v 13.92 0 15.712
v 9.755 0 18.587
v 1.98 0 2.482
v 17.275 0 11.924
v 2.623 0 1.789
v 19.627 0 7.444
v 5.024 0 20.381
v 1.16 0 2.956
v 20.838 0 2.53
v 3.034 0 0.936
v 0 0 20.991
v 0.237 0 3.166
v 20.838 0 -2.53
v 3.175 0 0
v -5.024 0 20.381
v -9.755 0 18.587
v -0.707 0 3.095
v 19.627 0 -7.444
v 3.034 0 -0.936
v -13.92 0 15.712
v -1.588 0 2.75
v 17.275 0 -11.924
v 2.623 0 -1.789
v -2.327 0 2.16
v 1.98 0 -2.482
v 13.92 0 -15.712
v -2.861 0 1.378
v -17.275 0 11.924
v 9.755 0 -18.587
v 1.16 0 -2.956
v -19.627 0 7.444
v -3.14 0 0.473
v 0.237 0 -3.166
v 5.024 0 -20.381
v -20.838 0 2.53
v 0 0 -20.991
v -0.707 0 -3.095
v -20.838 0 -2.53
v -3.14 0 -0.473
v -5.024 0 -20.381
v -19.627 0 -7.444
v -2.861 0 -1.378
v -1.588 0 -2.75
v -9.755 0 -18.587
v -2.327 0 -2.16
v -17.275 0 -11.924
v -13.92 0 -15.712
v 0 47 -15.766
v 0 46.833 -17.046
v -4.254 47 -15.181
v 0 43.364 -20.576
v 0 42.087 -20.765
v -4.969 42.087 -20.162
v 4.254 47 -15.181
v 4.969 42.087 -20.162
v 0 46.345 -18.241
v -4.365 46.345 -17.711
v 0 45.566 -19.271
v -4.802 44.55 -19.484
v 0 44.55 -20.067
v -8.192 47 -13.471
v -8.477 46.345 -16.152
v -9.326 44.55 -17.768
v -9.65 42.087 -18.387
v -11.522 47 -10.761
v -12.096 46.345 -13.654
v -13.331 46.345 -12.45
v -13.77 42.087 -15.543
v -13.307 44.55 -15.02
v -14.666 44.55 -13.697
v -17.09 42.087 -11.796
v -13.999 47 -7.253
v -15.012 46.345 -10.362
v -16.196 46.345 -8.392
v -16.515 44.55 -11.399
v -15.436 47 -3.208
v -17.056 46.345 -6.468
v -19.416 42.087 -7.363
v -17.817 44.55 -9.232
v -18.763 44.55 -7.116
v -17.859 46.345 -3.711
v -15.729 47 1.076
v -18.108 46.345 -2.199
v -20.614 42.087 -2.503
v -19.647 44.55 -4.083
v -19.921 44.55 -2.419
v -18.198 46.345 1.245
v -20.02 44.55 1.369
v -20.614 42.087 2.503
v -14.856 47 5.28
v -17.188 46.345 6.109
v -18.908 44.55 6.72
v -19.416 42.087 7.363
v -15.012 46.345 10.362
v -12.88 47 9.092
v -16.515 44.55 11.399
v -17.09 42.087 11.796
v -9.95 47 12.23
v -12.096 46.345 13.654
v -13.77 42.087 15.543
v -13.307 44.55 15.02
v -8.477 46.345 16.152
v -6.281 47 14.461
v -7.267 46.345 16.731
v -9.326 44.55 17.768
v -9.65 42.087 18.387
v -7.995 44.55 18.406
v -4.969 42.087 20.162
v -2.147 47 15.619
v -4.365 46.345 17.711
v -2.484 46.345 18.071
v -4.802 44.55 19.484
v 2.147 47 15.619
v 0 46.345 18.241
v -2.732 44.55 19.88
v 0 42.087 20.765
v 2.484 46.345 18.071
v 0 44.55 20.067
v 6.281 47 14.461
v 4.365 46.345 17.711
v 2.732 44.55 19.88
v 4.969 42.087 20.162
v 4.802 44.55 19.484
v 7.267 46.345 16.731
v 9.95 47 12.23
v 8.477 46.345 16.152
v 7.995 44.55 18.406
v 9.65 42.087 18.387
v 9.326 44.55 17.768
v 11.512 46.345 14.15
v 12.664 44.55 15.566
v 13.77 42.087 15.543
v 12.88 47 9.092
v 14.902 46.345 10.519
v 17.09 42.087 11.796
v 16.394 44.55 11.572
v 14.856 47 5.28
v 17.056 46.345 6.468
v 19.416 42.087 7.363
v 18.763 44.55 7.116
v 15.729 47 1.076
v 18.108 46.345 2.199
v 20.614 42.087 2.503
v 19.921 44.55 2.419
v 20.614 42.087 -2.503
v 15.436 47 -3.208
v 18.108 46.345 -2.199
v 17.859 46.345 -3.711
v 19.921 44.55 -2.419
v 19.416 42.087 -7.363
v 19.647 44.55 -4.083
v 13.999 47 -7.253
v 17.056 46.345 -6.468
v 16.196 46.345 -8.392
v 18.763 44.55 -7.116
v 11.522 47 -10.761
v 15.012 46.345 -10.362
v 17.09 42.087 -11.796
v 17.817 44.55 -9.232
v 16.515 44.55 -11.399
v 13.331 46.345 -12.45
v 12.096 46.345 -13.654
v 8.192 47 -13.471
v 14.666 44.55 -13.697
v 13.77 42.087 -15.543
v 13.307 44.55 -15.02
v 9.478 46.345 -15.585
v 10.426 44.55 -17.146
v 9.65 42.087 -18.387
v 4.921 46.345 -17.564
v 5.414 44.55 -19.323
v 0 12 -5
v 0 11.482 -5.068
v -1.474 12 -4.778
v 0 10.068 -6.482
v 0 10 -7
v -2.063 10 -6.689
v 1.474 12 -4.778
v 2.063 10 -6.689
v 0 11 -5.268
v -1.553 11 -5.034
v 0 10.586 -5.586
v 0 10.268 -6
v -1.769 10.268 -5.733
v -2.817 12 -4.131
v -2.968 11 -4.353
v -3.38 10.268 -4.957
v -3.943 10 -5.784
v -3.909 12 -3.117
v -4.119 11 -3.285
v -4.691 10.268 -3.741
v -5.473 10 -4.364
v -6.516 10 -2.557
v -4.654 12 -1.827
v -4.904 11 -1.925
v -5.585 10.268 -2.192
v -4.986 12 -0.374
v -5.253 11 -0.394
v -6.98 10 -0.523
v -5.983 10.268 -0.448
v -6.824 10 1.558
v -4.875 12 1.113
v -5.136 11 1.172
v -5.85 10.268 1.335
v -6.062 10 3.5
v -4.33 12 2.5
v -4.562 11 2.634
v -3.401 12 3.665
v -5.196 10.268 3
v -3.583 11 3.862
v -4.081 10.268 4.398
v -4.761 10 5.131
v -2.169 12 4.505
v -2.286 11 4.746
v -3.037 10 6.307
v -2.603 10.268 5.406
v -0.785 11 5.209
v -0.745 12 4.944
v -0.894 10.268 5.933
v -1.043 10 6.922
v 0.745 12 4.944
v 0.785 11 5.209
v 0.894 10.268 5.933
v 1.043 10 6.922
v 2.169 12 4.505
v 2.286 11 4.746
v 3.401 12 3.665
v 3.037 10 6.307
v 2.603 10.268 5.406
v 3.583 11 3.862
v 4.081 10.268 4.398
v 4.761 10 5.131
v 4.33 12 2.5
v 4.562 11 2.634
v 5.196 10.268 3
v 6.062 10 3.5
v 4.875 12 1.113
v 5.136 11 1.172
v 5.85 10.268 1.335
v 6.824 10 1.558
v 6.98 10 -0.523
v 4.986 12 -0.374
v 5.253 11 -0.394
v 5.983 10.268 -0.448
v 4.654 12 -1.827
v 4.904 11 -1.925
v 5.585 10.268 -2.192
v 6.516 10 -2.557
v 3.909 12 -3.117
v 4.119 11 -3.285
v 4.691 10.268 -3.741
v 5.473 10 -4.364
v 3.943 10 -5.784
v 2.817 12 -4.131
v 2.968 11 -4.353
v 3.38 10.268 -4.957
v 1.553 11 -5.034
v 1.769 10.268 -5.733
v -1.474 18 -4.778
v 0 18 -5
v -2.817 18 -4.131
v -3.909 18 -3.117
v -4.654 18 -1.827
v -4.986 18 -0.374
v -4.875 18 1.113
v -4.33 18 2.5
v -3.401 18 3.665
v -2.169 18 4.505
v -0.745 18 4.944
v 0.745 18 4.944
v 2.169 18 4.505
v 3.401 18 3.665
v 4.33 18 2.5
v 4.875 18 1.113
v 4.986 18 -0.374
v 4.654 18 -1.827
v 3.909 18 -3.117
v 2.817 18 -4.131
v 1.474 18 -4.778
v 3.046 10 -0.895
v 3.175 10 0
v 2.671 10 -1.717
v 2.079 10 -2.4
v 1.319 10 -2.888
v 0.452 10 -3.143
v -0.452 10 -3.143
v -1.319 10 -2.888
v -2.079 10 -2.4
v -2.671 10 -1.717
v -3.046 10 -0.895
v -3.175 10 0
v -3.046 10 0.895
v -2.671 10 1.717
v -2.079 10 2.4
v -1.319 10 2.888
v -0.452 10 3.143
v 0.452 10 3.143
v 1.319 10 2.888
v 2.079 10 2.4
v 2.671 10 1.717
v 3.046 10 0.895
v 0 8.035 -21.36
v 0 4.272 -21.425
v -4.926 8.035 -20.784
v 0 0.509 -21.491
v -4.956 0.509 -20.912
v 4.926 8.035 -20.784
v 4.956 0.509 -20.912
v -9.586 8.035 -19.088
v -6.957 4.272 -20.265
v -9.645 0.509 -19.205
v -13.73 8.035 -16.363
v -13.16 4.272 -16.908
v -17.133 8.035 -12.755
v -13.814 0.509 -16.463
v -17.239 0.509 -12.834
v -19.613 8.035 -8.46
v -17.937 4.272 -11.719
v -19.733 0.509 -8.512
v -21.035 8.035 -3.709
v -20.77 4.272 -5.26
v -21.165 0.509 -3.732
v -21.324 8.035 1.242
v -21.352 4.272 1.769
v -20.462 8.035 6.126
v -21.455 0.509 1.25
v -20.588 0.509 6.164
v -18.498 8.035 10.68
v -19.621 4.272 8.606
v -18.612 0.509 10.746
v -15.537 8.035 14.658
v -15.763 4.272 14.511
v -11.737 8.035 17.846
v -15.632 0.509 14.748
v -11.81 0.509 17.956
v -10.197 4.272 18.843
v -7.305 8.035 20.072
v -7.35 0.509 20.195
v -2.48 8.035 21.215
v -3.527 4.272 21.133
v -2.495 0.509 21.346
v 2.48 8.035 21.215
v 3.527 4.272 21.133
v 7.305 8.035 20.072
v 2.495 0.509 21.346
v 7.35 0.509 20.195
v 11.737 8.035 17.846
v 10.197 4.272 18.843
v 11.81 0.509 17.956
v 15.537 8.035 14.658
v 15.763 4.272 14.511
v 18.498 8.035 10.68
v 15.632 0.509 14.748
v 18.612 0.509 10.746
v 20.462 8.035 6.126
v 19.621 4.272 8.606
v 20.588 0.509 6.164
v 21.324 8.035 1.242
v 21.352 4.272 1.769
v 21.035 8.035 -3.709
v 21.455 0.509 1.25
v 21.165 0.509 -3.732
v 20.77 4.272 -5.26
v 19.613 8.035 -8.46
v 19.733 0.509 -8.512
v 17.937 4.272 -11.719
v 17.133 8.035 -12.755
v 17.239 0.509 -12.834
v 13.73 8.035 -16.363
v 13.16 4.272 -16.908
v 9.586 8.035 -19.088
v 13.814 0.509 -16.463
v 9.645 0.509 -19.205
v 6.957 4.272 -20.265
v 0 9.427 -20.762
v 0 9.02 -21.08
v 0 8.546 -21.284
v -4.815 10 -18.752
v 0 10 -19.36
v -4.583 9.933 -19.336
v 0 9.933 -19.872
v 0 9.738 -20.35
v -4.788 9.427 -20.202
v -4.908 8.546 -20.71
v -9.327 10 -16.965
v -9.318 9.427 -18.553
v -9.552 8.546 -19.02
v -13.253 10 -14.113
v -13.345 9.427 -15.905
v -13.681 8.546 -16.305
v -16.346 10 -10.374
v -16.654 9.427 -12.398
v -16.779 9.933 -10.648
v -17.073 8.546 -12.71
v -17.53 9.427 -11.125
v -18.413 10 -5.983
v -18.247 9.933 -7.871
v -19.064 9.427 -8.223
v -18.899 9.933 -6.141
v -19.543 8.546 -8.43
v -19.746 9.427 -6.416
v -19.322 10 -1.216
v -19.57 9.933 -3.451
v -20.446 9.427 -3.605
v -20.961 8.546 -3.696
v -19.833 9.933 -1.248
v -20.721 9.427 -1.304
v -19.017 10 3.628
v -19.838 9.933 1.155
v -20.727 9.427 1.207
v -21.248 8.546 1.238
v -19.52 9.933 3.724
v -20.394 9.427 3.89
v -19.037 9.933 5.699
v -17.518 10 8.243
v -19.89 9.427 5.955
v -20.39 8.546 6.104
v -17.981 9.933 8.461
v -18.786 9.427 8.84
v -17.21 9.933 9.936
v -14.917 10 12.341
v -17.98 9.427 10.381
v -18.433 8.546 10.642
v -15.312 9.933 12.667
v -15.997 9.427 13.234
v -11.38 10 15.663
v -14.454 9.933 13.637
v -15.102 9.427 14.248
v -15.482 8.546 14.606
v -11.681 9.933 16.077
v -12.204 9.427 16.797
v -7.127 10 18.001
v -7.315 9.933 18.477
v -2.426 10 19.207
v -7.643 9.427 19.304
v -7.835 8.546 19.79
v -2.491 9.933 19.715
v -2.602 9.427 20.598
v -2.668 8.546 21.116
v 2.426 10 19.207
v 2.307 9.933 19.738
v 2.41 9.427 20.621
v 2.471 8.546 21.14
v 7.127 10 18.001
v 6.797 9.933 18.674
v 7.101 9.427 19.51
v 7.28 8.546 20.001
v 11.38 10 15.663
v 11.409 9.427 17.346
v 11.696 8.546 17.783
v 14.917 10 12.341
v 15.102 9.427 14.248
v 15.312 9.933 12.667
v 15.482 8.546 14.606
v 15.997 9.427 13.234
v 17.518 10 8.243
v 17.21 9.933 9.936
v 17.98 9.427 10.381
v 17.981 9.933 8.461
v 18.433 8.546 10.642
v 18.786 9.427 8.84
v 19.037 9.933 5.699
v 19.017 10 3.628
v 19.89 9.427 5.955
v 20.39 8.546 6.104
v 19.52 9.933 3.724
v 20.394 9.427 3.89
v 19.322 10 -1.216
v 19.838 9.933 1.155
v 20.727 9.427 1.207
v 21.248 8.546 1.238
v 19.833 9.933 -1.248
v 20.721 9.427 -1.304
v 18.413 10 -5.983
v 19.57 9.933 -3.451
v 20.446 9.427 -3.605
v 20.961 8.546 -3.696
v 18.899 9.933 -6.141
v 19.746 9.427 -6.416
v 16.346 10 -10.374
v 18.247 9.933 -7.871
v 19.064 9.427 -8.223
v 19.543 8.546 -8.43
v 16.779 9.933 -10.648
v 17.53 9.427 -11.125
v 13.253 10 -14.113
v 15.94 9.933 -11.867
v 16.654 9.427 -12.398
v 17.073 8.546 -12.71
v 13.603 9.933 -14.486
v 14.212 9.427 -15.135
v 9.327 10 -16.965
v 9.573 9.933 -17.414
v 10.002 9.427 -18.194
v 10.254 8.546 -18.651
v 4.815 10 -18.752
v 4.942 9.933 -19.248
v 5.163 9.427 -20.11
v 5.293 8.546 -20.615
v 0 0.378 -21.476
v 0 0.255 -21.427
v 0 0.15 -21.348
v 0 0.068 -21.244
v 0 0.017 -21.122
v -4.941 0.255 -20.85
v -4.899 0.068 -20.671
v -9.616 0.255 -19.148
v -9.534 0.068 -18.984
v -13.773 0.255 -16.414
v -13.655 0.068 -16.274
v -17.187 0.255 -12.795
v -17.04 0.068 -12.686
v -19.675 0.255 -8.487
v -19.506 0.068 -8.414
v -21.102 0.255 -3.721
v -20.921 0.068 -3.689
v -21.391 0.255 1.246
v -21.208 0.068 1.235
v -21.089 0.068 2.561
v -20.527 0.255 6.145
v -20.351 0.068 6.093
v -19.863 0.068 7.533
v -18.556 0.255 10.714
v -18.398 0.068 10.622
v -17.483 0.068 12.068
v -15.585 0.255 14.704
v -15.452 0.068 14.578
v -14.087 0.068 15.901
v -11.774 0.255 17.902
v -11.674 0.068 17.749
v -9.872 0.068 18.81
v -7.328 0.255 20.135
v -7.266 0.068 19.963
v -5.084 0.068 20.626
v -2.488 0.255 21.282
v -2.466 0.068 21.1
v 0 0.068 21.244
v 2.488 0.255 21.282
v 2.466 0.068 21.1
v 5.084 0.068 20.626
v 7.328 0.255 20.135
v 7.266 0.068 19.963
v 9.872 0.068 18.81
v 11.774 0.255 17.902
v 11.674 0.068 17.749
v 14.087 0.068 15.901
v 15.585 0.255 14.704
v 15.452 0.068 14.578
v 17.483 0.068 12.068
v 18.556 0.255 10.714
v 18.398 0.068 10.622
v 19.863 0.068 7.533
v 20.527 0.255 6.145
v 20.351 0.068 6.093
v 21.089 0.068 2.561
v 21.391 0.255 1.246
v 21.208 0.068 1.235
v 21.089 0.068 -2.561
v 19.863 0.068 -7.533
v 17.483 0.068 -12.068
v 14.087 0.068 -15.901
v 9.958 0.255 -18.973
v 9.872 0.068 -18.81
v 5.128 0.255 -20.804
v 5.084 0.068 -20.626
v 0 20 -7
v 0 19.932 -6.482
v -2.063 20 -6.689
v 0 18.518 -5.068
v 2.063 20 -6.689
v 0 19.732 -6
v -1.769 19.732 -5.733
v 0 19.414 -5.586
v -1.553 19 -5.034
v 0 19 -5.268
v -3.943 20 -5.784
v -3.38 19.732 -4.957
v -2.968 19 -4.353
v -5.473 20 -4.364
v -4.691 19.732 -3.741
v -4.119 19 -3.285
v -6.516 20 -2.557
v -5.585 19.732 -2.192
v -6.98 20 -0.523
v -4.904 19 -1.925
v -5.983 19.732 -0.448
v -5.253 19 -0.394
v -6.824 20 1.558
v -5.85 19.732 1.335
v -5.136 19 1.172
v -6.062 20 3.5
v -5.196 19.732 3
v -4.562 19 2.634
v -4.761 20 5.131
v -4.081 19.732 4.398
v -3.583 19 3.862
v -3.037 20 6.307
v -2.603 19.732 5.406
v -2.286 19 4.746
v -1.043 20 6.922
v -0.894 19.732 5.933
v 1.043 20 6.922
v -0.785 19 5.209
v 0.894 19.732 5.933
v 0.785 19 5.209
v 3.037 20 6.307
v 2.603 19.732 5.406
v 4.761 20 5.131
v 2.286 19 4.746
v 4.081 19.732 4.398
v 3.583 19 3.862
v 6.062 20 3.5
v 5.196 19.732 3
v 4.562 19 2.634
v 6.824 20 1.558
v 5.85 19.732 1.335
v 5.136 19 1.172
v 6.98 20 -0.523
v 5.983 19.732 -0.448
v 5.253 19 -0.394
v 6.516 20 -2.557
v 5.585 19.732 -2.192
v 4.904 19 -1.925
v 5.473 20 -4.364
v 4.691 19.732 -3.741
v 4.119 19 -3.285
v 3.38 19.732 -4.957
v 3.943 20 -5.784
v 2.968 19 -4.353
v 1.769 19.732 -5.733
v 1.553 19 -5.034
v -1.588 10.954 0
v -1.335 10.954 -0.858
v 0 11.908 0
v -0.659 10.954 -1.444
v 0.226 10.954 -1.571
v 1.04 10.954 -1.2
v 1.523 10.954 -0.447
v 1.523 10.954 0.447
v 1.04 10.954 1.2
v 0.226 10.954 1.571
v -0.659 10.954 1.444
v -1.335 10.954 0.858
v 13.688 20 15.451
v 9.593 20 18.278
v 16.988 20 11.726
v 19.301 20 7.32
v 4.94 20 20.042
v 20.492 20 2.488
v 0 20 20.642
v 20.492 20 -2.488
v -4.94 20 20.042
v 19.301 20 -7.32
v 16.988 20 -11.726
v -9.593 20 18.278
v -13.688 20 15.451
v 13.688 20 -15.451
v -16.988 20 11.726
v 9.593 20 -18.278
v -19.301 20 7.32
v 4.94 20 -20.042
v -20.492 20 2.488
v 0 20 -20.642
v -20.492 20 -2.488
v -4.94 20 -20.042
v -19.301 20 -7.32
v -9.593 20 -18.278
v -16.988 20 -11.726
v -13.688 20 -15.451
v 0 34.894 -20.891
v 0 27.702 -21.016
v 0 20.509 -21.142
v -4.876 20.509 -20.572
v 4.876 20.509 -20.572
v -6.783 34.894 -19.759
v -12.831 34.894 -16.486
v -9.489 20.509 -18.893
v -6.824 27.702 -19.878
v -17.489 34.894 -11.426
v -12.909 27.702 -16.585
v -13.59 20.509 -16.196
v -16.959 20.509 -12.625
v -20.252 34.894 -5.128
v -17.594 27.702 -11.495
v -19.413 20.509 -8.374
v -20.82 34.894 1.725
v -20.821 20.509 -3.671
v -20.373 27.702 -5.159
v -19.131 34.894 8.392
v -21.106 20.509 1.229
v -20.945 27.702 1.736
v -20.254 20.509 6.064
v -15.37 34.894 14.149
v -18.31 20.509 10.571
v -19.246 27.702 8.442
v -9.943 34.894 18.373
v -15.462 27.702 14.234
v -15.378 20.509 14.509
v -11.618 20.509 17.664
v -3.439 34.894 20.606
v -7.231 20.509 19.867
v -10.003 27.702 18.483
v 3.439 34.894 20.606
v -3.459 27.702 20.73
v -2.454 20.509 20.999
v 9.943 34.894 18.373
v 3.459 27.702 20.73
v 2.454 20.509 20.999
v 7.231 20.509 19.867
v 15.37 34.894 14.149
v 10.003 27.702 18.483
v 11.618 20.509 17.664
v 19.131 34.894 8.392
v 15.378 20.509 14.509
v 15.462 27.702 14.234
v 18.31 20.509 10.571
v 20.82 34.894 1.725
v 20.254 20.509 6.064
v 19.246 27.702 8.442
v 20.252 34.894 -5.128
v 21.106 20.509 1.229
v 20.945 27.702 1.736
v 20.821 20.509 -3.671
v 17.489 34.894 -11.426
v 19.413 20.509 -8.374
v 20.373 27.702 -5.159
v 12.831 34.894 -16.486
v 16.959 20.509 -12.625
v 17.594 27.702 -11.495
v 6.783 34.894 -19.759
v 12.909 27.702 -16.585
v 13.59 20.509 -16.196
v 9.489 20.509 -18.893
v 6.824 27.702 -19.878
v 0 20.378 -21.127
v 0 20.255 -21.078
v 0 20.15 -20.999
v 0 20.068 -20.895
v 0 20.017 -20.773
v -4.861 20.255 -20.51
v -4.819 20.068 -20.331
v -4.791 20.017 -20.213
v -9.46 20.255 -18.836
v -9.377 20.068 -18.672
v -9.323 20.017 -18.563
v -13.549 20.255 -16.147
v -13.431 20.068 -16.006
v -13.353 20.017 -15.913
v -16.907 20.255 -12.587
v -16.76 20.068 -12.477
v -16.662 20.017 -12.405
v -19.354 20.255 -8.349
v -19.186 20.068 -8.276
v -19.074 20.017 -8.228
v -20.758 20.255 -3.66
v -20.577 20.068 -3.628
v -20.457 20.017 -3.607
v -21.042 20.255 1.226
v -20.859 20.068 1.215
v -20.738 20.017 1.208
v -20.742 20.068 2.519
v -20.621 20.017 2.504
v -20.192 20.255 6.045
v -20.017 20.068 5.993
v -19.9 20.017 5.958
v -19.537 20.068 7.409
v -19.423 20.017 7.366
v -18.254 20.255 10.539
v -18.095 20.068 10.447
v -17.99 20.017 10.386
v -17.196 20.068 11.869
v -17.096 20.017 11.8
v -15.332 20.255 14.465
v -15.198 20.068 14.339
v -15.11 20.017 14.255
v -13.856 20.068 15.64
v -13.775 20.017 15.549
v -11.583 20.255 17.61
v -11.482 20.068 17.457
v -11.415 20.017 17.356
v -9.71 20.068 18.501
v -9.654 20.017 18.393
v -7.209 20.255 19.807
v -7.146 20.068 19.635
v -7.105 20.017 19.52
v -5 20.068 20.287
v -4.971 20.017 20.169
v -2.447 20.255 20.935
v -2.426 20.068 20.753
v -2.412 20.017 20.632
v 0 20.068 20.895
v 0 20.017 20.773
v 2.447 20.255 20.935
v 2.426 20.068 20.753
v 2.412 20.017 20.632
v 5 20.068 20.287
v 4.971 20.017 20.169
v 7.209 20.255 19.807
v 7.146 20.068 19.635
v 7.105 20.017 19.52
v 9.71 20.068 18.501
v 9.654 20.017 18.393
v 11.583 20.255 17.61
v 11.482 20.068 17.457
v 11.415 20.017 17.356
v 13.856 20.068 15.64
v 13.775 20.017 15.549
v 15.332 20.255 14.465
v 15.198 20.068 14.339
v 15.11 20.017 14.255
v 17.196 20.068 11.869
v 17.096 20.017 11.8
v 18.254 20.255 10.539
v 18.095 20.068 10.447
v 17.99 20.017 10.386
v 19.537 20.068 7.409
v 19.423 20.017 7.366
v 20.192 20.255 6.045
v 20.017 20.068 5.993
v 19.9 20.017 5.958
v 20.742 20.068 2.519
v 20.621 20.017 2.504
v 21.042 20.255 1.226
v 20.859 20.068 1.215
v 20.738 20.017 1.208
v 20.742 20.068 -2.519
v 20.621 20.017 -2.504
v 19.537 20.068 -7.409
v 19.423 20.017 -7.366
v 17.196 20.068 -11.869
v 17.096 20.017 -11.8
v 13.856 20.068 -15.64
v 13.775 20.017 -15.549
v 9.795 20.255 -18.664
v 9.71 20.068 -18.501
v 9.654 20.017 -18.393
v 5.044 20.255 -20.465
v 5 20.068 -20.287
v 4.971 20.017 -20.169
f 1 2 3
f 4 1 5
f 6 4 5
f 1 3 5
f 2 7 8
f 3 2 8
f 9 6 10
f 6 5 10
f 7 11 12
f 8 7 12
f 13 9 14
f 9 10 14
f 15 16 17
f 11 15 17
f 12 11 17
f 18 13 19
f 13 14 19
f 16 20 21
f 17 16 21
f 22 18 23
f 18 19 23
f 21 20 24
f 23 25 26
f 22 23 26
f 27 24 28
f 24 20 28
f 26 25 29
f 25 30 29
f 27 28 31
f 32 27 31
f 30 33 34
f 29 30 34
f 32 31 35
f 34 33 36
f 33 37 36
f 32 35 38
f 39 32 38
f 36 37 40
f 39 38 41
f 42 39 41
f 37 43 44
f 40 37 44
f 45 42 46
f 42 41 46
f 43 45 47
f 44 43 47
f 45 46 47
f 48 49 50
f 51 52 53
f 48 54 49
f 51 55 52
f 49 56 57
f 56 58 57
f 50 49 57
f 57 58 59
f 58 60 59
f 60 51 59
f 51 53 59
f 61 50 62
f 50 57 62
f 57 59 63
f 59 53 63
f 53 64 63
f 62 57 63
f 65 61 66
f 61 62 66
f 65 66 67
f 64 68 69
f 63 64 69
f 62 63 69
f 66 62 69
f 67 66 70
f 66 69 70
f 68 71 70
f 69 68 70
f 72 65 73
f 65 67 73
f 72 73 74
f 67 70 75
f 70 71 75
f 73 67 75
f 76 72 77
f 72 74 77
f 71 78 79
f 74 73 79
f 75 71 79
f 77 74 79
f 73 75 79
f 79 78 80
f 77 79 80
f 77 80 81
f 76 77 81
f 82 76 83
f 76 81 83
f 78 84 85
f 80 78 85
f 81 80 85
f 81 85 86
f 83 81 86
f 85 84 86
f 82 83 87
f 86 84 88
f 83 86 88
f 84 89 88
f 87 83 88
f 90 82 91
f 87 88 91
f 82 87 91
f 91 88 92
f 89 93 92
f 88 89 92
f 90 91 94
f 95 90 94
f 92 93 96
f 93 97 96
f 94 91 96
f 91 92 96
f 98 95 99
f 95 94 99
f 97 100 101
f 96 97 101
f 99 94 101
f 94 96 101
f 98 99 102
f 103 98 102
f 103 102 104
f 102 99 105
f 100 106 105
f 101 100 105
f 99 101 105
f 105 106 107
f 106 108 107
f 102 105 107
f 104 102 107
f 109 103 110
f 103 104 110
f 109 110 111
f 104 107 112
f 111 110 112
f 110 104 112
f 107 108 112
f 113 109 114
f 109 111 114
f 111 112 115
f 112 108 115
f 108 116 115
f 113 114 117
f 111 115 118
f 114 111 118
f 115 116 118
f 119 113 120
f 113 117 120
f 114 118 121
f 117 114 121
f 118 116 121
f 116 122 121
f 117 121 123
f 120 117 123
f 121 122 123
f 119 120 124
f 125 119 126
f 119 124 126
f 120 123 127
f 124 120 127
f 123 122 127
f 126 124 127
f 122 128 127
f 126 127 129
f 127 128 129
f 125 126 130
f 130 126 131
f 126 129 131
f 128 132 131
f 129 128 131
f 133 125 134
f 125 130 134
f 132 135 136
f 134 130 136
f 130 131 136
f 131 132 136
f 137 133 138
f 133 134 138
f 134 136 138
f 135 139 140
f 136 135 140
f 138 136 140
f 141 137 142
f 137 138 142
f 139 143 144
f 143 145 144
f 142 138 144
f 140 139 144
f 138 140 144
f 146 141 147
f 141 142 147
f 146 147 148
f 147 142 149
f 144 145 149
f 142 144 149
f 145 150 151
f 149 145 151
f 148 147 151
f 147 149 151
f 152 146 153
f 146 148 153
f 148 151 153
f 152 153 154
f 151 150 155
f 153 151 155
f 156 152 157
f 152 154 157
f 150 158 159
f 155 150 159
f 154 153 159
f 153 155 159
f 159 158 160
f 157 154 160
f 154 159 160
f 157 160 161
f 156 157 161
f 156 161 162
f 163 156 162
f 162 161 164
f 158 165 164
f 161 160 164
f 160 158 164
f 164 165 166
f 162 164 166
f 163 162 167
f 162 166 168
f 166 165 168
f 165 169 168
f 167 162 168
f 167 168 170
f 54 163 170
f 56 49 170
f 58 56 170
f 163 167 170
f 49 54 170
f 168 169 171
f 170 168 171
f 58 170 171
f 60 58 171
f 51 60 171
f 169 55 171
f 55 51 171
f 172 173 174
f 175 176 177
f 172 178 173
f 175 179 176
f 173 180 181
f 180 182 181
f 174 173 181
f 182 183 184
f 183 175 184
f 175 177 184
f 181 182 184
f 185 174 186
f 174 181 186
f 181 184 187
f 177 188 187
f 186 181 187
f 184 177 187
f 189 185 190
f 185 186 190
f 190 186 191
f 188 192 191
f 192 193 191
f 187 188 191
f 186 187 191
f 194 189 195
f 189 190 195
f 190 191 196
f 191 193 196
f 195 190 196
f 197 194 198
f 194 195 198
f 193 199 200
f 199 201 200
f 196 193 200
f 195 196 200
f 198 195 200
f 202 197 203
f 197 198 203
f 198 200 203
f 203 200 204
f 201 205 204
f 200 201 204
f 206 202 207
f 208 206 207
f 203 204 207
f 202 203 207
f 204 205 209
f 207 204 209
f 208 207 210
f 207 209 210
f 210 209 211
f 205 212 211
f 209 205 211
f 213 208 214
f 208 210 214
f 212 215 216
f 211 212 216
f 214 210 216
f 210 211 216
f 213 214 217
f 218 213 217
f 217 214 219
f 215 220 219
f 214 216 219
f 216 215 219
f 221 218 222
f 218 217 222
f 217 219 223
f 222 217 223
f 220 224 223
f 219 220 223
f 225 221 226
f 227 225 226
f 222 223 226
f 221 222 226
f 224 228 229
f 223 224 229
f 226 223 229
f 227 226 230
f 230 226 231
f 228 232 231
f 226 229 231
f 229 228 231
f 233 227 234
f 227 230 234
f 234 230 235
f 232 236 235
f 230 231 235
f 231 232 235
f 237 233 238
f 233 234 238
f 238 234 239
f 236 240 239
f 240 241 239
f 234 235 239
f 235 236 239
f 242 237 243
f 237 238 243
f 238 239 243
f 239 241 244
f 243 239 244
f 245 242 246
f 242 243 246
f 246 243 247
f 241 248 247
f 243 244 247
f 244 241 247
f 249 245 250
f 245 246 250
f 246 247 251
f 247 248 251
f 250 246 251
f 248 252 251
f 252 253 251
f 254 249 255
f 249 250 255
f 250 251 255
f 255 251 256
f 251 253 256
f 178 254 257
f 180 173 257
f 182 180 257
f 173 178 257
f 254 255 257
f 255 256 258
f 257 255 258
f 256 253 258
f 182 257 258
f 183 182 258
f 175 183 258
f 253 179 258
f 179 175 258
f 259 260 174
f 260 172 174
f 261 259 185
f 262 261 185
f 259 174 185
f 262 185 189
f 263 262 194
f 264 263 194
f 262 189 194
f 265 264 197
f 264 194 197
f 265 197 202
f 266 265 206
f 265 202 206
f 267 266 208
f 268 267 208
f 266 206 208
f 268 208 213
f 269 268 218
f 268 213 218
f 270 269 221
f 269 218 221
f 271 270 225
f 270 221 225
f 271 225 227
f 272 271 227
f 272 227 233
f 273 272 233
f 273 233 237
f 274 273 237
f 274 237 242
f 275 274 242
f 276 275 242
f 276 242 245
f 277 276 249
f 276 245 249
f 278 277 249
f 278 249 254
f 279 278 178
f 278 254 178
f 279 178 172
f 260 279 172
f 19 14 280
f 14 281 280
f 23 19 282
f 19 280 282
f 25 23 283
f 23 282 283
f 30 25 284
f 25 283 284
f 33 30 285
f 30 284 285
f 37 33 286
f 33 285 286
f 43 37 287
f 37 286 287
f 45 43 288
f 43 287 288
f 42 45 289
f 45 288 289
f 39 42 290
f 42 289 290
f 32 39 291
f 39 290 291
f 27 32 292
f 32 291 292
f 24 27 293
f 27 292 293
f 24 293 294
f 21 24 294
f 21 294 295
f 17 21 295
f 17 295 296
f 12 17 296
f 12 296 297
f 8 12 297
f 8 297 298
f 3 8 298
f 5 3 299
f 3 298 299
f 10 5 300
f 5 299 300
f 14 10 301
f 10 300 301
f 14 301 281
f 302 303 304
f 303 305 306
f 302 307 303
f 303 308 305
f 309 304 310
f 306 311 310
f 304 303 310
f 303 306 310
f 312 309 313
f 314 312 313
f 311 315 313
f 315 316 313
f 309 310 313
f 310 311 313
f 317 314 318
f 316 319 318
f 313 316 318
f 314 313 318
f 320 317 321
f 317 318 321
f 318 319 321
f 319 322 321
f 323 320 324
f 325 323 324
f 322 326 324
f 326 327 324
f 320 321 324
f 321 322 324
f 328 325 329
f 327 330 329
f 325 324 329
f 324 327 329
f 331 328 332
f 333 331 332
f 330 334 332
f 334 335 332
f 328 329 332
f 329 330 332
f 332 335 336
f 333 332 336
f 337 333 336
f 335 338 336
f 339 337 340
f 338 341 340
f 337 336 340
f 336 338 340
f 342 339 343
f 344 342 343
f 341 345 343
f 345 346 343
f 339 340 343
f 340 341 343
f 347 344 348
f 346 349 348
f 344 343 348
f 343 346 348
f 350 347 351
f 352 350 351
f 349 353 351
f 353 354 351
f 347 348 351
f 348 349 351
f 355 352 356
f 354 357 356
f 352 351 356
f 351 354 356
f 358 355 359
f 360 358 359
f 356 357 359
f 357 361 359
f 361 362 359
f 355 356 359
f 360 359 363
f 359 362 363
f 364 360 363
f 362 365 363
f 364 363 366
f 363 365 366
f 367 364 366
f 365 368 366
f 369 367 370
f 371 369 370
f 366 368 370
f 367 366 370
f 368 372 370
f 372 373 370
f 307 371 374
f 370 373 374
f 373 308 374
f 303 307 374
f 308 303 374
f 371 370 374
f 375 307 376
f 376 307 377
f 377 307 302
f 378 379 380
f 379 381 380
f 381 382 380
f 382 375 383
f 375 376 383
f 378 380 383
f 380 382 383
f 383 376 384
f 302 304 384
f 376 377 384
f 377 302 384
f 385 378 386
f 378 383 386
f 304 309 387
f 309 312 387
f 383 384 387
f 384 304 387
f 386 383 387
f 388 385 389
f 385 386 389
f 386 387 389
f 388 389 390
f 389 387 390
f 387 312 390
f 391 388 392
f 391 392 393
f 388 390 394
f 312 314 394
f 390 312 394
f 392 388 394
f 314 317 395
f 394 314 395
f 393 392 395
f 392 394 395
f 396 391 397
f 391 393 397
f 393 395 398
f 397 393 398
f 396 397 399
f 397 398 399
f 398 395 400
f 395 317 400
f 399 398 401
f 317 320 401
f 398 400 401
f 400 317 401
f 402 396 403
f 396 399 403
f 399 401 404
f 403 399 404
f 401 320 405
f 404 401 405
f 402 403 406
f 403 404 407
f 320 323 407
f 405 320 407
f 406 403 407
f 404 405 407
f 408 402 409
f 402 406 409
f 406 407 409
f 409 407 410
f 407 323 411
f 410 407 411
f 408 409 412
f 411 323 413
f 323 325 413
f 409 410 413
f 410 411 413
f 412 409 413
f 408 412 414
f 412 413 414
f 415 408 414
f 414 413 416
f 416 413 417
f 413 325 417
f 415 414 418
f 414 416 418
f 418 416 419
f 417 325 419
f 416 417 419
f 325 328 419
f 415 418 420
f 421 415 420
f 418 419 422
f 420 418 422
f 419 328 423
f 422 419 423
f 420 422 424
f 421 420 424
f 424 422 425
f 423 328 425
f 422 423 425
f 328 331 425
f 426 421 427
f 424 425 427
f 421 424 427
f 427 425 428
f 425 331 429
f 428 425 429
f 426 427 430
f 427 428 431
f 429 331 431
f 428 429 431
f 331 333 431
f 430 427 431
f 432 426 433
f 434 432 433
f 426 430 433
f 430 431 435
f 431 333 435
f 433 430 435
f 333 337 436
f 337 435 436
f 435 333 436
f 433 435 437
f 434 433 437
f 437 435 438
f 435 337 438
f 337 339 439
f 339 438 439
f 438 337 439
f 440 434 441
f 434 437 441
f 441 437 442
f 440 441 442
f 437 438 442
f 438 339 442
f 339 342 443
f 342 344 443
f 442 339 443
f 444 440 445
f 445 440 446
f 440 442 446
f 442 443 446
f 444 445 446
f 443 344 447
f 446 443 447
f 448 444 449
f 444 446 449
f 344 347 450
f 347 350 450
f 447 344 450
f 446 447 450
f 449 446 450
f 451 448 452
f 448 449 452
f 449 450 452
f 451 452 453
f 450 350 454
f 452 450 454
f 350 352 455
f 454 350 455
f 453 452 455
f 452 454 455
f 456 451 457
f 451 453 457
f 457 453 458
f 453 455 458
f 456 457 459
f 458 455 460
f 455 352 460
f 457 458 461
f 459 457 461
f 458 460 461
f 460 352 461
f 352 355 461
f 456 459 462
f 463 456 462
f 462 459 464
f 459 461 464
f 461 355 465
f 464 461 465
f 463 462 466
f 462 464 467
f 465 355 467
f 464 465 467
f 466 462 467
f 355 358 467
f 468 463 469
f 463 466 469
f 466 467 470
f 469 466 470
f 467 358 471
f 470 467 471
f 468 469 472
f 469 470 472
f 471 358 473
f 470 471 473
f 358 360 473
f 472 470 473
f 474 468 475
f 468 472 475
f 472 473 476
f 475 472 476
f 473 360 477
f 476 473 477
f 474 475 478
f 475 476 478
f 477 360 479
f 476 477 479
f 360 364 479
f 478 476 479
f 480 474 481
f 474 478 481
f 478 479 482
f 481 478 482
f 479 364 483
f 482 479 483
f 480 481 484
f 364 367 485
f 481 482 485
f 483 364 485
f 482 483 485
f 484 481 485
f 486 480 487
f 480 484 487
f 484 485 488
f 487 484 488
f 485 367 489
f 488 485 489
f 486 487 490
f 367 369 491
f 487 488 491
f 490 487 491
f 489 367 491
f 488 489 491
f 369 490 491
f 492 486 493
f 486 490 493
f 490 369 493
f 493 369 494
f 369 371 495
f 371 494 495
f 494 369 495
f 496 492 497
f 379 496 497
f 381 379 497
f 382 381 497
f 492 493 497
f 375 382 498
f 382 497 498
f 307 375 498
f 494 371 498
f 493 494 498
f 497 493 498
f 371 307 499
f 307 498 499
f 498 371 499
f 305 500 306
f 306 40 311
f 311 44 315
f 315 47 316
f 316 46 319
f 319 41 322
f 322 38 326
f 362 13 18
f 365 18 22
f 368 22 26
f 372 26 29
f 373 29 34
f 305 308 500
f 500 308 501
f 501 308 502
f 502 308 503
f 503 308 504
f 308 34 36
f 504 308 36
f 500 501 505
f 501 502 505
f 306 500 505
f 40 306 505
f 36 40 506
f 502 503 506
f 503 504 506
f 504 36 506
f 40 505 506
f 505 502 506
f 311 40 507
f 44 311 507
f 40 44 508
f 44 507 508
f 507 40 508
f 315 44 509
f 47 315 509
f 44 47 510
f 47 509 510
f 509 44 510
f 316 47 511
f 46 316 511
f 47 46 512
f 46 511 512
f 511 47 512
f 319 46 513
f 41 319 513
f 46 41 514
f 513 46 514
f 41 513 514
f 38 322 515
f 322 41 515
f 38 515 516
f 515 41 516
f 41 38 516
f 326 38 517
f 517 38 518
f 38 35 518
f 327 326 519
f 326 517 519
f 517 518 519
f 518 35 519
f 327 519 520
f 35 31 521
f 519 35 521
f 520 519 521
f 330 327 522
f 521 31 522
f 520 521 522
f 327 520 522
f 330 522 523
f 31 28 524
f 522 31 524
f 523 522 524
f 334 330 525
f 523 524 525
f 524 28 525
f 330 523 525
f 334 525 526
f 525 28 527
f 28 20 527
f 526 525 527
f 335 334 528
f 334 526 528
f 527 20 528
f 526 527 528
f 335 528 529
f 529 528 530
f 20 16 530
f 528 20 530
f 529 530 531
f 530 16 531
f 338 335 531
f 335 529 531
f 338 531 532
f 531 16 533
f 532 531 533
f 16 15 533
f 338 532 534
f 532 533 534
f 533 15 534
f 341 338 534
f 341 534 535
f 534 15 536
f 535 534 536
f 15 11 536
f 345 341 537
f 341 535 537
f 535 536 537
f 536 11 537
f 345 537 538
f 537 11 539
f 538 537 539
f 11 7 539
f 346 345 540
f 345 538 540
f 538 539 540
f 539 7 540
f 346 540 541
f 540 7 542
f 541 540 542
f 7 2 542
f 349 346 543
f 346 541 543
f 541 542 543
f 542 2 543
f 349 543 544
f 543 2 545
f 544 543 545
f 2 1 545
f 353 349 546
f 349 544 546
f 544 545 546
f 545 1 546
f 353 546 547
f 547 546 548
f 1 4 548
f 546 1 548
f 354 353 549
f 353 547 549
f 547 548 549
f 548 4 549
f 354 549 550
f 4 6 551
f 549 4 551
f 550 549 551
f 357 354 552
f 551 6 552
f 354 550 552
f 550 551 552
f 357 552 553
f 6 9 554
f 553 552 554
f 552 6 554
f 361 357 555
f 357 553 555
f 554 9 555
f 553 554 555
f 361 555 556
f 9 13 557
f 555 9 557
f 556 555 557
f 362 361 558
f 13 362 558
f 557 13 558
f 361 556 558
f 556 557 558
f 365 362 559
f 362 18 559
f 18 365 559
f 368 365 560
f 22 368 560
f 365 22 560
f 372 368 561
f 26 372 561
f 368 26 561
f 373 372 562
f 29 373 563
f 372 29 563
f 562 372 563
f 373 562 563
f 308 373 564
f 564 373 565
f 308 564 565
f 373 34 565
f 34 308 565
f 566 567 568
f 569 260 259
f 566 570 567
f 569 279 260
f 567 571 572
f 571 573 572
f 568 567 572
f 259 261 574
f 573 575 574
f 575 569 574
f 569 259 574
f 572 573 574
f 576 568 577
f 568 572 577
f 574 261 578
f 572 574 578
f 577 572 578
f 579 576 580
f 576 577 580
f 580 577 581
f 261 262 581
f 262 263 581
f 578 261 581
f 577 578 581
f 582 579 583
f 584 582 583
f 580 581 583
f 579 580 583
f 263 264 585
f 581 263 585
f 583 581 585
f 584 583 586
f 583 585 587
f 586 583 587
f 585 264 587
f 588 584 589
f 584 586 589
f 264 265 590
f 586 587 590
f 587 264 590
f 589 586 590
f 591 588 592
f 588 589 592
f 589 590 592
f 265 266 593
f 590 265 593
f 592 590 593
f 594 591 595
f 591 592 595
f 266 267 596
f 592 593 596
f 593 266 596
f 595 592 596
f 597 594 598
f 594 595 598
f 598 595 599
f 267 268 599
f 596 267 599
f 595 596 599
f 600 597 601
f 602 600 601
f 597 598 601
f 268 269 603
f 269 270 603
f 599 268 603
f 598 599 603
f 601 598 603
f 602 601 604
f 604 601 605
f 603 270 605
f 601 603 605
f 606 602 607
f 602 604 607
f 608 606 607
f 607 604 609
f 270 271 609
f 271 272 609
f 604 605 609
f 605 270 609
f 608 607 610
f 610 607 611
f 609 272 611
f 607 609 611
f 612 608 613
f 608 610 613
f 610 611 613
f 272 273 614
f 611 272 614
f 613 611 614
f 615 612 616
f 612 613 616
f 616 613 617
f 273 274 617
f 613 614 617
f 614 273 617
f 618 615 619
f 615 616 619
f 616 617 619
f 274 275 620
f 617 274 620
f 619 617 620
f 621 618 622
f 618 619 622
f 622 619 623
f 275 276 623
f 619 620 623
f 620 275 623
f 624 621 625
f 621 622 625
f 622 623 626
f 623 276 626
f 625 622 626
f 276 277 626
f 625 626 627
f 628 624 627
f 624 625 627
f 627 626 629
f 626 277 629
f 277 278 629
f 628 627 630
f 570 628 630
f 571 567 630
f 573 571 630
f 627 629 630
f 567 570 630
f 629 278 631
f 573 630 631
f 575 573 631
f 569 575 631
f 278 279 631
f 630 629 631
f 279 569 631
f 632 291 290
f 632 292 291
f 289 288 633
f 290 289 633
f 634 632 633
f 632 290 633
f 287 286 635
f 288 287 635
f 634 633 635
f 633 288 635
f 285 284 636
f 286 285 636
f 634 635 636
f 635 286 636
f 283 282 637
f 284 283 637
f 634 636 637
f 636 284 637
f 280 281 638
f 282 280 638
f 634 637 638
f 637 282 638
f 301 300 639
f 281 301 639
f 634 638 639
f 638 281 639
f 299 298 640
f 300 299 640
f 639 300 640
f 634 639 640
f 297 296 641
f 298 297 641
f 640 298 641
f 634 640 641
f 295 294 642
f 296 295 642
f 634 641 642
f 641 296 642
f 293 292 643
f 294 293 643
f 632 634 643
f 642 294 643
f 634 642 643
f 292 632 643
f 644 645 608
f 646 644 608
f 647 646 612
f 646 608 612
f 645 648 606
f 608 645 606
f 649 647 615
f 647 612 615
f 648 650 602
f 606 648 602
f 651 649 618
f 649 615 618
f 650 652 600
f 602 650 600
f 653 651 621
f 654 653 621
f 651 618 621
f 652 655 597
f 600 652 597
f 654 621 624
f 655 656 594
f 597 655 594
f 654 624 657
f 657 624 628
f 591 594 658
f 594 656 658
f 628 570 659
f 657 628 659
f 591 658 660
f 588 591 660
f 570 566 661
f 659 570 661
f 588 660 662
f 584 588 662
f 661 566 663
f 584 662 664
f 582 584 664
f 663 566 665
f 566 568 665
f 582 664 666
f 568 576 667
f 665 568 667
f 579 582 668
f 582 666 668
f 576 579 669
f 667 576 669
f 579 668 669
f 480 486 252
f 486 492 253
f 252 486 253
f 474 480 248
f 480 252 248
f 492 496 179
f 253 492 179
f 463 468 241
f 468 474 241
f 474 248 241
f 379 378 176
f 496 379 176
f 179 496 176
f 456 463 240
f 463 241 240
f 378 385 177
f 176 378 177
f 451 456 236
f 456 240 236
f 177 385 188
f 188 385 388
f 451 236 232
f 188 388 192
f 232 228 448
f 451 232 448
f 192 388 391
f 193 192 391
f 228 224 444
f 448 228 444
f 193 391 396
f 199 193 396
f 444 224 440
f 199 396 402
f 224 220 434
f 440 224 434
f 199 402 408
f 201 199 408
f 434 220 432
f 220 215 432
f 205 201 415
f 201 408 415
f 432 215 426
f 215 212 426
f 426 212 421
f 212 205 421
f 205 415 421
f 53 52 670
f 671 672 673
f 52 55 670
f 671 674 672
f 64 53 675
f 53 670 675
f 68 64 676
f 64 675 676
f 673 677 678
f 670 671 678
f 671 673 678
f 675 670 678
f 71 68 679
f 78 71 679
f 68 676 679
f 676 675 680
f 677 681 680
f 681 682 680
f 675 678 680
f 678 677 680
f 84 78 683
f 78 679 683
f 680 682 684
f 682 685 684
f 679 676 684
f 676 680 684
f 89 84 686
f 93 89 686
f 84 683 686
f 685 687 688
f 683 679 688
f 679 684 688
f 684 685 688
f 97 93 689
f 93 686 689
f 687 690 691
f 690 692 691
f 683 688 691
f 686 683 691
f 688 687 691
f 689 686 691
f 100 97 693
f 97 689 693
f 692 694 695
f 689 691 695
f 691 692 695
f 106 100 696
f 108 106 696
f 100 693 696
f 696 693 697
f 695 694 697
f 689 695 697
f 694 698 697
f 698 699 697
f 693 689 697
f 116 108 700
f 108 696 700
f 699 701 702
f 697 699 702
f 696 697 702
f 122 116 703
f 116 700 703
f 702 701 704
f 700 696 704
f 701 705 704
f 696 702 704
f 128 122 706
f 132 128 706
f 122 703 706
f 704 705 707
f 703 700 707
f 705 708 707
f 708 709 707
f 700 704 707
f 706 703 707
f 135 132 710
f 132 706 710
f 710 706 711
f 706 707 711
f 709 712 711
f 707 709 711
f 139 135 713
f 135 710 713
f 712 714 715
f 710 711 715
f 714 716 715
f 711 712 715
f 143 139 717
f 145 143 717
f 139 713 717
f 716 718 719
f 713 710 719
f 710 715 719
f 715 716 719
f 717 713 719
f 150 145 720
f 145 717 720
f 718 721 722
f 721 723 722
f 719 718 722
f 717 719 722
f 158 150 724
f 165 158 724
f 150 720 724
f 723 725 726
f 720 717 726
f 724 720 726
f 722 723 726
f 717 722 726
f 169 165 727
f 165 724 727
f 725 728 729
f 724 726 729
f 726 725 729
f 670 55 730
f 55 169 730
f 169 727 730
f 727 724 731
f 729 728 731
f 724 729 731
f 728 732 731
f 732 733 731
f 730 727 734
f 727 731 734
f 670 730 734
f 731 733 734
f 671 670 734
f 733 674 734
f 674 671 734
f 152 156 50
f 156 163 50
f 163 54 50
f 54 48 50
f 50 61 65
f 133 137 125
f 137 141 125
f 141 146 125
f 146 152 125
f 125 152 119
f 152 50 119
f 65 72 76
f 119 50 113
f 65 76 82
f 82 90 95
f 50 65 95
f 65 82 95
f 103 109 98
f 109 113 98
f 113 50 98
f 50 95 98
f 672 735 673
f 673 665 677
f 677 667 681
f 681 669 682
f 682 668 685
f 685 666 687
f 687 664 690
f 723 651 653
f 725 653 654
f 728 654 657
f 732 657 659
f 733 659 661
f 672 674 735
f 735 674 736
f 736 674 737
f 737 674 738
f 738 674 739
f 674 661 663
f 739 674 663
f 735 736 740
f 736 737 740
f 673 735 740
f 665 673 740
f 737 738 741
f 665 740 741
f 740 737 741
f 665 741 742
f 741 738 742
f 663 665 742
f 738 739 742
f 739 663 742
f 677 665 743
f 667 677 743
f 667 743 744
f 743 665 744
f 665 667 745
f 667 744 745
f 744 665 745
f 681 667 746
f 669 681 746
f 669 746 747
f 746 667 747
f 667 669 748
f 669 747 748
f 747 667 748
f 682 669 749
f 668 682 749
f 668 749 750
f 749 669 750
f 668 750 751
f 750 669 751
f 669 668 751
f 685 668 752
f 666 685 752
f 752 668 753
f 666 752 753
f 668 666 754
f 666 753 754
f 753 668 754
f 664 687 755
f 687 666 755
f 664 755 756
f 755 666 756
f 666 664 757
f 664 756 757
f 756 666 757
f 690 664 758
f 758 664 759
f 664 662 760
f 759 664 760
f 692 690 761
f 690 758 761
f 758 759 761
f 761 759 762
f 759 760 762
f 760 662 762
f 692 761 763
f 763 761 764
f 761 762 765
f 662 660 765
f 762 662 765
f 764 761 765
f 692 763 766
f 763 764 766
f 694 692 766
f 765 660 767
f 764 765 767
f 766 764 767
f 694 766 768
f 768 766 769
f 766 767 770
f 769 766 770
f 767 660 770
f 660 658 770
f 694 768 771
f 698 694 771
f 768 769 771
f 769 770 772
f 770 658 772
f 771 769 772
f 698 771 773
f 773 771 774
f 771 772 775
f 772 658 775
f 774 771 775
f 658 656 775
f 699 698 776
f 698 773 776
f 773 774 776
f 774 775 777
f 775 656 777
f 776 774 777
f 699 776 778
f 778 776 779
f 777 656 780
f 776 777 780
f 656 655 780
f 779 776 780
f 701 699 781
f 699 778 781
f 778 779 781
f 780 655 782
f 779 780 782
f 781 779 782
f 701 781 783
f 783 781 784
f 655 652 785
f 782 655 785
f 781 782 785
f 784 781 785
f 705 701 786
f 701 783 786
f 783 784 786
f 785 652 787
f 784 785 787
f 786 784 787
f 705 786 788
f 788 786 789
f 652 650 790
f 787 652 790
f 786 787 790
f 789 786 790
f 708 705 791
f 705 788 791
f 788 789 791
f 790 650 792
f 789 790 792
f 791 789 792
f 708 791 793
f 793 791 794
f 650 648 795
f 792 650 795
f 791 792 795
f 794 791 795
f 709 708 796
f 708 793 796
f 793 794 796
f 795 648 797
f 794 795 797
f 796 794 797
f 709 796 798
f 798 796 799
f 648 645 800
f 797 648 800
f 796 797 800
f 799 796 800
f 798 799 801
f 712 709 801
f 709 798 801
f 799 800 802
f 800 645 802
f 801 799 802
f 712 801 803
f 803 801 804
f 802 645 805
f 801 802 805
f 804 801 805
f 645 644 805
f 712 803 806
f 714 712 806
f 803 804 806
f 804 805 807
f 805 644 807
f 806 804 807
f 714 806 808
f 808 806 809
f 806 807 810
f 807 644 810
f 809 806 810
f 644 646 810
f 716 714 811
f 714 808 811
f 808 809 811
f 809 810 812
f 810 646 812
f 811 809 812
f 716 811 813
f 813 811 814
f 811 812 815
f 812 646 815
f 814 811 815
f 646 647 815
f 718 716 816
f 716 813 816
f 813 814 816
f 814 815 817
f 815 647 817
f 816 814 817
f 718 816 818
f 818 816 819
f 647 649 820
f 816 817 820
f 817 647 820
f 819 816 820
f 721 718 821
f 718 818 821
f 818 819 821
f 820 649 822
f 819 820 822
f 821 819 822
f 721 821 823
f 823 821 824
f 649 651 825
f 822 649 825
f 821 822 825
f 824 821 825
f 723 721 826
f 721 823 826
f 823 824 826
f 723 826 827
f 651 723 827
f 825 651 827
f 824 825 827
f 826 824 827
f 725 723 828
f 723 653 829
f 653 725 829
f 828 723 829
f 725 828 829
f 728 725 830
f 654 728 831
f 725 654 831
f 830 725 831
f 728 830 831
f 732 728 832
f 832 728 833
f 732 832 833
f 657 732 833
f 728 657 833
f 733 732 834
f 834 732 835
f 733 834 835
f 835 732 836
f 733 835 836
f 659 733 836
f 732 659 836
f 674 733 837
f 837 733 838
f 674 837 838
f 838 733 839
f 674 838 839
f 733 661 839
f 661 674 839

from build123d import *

# Parameters (mm, degrees)
F_1_4_0_25_DIAMETER_HOLE1_D     = 6.35
F_1_4_0_25_DIAMETER_HOLE1_DEPTH = 10
F_1_4_0_25_DIAMETER_HOLE1_TIP   = 1.907732465


with BuildPart() as part:
    # Sketch1 → Revolve1 (revolve)
    with BuildSketch(Plane.XY, mode=Mode.PRIVATE) as revolve1_sk:
        with BuildLine():
            Line((0, 47), (15.766125633, 47))
            ThreePointArc((15.766125633, 47), (19.270671954, 45.566252246), (20.765364109, 42.087262032))
            Line((20.765364109, 42.087262032), (21.142018853, 20.508726203))
            ThreePointArc((21.142018853, 20.508726203), (20.99872023, 20.149545368), (20.642095005, 20))
            Line((20.642095005, 20), (7, 20))
            ThreePointArc((7, 20), (5.585786438, 19.414213562), (5, 18))
            Line((5, 18), (5, 12))
            ThreePointArc((5, 12), (5.585786438, 10.585786438), (7, 10))
            Line((7, 10), (19.360054824, 10))
            ThreePointArc((19.360054824, 10), (20.761873353, 9.426500898), (21.359750215, 8.034904813))
            Line((21.359750215, 8.034904813), (21.491120151, 0.508726203))
            ThreePointArc((21.491120151, 0.508726203), (21.347821528, 0.149545368), (20.991196304, 0))
            Line((20.991196304, 0), (0, 0))
            Line((0, 0), (0, 47))
        make_face()
    revolve(revolve1_sk.sketch.rotate(Axis((0, 0, 0), (0, 1, 0)), 90), axis=Axis((0, 0, 0), (0, 1, 0)))

    # 1/4 (0.25) Diameter Hole1
    with Locations(Plane(origin=(0, 0, 0), x_dir=(-1, 0, 0), z_dir=(0, -1, 0))):
        with Locations((0, 0)):
            Hole(F_1_4_0_25_DIAMETER_HOLE1_D / 2, depth=F_1_4_0_25_DIAMETER_HOLE1_DEPTH)
            with Locations((0, 0, -(F_1_4_0_25_DIAMETER_HOLE1_DEPTH + F_1_4_0_25_DIAMETER_HOLE1_TIP / 2))):  # 118° drill point
                Cone(0, F_1_4_0_25_DIAMETER_HOLE1_D / 2, F_1_4_0_25_DIAMETER_HOLE1_TIP, mode=Mode.SUBTRACT)


solid = part.part
